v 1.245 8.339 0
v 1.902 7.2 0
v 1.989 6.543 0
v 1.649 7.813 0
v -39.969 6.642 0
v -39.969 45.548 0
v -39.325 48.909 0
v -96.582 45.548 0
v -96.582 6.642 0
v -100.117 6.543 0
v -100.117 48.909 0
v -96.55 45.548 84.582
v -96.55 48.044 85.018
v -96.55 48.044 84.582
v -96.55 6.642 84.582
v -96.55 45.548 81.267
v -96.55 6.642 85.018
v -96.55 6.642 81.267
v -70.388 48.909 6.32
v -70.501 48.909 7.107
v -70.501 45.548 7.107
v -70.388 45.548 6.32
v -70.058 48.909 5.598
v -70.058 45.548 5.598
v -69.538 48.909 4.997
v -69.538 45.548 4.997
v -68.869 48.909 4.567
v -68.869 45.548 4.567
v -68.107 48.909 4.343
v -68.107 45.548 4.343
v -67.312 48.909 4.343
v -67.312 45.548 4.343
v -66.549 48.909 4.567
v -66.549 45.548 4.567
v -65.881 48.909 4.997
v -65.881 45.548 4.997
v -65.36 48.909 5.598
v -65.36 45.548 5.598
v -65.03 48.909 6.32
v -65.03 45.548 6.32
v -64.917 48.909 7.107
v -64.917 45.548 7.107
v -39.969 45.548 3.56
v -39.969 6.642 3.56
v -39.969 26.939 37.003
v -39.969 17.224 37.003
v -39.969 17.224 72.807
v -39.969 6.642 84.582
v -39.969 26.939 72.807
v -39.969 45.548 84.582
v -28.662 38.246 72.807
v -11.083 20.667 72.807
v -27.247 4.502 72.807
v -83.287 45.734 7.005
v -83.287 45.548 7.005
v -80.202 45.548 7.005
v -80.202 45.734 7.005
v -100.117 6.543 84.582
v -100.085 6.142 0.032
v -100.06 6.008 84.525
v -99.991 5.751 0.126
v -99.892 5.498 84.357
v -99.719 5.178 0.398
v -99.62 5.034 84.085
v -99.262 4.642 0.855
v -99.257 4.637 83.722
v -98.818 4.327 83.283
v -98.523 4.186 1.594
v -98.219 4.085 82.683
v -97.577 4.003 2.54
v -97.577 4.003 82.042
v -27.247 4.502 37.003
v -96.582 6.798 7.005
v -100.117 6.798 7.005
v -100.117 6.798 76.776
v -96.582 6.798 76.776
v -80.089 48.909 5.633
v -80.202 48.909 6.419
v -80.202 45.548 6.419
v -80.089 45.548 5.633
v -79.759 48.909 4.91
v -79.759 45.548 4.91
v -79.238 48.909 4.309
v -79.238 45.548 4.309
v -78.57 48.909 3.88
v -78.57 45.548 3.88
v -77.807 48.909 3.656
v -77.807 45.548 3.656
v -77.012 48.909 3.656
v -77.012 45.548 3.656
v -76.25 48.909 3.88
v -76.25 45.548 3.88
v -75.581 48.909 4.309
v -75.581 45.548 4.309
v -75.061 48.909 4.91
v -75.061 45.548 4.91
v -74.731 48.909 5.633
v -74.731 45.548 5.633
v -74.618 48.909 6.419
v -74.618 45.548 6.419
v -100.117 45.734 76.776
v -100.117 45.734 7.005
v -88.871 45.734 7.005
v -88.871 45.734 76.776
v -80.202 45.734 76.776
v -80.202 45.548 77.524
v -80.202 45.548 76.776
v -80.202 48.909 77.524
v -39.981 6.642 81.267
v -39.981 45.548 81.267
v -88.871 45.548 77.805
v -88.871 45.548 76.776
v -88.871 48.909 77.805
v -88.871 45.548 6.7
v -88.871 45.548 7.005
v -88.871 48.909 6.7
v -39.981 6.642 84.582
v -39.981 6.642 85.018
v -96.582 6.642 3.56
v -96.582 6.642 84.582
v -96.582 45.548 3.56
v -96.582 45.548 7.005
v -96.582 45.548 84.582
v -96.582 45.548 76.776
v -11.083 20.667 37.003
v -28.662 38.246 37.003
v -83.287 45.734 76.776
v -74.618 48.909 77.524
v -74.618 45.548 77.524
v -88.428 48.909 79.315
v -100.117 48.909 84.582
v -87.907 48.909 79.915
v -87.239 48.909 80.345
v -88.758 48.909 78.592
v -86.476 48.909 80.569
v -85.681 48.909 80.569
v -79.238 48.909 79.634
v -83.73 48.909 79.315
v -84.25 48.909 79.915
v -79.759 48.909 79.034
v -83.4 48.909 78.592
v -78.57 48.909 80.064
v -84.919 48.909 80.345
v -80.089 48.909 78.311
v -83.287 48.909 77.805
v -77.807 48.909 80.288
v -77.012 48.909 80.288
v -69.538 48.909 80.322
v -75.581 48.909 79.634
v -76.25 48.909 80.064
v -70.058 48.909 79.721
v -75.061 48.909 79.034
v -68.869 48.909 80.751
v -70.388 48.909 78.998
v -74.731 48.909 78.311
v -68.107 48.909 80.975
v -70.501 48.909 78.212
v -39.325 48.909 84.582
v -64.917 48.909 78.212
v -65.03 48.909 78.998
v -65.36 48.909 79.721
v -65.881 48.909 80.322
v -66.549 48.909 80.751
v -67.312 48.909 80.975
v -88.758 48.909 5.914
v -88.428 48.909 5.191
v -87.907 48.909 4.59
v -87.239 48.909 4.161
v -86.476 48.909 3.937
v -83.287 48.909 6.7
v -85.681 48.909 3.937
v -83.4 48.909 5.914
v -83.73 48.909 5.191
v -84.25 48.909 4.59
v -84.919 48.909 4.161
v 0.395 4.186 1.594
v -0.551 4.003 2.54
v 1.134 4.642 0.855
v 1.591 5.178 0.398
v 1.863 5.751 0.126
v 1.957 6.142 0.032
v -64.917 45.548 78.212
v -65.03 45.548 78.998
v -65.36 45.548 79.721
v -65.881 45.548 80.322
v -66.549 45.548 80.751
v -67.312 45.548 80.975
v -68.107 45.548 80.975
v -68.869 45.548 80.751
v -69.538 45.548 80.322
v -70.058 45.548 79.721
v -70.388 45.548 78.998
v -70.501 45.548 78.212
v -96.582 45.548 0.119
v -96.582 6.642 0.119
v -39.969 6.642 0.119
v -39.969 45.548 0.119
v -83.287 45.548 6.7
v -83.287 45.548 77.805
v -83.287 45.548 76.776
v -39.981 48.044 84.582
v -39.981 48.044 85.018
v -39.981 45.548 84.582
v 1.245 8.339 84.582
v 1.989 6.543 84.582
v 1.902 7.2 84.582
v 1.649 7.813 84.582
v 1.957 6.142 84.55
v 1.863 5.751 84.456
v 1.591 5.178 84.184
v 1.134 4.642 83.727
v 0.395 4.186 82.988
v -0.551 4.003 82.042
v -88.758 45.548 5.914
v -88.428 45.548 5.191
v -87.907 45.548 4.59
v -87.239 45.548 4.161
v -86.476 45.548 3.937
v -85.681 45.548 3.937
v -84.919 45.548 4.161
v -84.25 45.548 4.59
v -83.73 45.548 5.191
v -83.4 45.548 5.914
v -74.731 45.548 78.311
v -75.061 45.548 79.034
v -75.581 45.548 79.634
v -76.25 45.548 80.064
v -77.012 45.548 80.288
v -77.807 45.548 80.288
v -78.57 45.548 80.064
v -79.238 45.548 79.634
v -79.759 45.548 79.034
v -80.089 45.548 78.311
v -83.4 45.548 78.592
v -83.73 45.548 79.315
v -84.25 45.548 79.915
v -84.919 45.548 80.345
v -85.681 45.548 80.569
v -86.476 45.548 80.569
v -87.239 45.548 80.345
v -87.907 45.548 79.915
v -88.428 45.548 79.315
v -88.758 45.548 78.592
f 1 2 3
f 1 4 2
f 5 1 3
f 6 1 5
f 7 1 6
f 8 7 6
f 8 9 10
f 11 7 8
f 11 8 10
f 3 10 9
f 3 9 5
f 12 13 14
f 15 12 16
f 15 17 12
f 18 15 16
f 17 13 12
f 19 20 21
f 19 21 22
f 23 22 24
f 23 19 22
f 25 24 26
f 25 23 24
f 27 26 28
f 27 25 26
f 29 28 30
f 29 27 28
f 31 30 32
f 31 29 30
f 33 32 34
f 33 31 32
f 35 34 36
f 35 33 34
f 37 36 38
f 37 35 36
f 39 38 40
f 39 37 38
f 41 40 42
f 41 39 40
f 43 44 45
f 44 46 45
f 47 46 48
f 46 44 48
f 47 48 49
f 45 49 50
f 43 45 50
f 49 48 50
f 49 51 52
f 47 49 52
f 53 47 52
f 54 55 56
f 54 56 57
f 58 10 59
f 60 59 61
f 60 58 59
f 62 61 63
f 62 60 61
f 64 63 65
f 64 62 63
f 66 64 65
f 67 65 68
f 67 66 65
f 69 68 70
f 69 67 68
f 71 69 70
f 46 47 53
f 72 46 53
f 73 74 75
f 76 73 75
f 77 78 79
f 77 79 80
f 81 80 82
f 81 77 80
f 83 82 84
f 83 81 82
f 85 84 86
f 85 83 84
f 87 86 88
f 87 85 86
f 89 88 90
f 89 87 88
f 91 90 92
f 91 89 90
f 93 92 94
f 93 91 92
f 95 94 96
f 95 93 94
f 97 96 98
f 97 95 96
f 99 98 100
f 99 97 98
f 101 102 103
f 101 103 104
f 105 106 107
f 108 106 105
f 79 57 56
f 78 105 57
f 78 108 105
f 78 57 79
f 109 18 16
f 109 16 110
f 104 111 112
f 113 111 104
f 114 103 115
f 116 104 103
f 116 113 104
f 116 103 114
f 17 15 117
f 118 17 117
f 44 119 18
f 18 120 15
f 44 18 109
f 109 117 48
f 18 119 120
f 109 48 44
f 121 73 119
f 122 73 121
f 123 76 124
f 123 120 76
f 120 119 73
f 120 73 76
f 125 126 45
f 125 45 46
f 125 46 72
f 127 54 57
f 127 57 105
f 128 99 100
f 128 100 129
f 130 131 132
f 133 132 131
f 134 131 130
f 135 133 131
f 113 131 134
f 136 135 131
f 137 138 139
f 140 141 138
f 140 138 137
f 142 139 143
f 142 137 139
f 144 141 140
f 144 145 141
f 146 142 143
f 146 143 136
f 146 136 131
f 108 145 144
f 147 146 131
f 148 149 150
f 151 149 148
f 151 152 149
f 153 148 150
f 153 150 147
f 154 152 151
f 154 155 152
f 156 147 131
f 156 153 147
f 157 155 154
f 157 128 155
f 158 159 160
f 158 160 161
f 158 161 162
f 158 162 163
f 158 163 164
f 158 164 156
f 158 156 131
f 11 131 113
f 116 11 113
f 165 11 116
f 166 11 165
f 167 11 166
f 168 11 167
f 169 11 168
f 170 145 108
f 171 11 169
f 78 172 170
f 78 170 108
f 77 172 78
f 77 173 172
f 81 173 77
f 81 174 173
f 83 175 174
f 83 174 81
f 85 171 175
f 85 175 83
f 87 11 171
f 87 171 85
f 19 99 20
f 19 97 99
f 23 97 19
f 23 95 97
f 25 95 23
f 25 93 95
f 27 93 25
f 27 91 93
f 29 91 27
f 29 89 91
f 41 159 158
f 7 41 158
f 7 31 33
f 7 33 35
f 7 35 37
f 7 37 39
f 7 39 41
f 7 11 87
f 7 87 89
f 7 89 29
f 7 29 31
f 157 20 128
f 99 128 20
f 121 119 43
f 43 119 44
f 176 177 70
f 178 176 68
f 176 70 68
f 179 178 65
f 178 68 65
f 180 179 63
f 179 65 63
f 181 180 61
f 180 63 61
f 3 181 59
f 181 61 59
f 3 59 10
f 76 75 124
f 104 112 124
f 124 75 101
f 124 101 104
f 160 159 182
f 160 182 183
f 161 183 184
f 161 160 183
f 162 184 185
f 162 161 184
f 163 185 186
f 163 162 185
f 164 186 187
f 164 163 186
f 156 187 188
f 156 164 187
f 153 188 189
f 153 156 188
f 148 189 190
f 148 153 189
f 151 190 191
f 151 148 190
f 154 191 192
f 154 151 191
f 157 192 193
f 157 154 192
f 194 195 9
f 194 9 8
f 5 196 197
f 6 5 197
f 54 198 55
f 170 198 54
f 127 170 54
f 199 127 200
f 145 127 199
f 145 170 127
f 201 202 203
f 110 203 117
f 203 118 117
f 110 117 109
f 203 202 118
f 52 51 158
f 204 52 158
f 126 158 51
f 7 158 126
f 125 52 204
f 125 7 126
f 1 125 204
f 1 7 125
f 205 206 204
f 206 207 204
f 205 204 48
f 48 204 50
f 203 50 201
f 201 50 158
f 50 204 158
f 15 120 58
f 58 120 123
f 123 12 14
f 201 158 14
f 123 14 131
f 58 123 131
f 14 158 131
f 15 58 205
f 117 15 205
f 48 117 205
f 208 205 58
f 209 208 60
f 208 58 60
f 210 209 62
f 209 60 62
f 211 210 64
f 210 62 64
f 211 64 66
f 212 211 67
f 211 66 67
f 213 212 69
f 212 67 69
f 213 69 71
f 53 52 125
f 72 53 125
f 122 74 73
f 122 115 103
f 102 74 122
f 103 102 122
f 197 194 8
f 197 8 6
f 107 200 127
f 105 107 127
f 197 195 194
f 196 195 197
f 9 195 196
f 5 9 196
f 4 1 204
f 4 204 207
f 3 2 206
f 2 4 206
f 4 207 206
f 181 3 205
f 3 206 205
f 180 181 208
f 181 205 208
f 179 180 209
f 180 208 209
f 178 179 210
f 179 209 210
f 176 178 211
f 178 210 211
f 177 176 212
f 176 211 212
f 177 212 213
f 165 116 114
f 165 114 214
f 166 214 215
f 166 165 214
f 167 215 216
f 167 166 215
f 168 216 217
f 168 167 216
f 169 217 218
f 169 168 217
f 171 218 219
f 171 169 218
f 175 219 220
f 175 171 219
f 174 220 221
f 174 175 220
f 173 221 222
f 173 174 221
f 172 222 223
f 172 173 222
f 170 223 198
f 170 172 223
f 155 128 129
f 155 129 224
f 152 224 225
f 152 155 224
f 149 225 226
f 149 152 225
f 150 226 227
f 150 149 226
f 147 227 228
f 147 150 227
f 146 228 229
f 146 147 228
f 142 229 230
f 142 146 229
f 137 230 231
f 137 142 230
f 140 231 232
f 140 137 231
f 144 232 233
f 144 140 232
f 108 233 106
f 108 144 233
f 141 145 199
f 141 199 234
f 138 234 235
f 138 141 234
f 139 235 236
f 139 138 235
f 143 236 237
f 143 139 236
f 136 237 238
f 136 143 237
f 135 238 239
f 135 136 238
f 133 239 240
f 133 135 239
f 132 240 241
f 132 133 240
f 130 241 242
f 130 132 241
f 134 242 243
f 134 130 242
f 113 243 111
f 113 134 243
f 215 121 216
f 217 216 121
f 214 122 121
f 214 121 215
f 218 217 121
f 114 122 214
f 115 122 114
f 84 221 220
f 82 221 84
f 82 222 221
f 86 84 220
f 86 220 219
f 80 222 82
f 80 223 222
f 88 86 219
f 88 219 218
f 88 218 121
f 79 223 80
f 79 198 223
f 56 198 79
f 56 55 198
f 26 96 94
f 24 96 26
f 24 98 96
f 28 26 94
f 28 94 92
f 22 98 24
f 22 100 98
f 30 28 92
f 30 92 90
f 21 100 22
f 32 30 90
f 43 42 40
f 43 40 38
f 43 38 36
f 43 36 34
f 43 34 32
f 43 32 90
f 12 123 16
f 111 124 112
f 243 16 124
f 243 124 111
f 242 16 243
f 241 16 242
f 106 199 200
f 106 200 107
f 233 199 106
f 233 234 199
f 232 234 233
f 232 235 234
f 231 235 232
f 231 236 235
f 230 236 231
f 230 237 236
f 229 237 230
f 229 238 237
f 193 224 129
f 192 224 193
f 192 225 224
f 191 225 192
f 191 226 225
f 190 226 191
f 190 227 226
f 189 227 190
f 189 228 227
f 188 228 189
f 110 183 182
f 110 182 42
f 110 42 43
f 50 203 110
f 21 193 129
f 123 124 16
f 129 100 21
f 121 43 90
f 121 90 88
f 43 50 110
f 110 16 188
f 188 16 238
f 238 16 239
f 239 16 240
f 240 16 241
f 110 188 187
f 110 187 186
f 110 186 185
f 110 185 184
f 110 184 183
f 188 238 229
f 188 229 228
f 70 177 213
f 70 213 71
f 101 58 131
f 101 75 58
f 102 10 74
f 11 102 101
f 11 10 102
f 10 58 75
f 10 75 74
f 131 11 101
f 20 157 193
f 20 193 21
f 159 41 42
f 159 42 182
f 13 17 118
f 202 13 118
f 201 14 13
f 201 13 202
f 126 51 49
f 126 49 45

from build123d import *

# Parameters (mm, degrees)
Y_KSEKLIK_EKSTR_ZYON1_DEPTH = 84.582
IZIM2_W                     = 56.613252044
IZIM2_H                     = 38.905458561
KES_EKSTR_ZYON1_DEPTH       = 84.582
IZIM3_W                     = 24.859999106
IZIM3_H                     = 35.80382045
KES_EKSTR_ZYON2_DEPTH       = 22.86
IZIM4_W                     = 56.56840029
IZIM4_H                     = 3.7507773
Y_KSEKLIK_EKSTR_ZYON3_DEPTH = 41.402
IZIM5_W                     = 56.873307594
IZIM5_H                     = 3.441337166
Y_KSEKLIK_EKSTR_ZYON4_DEPTH = 41.402
KES_EKSTR_ZYON3_DEPTH       = 20.828
IZIM7_W                     = 69.770370065
IZIM7_H                     = 38.93587287
KES_EKSTR_ZYON4_DEPTH       = 20.828
RADYUS1_R                   = 2.54


with BuildPart() as part:
    # Çizim1 → Yükseklik-Ekstrüzyon1 (new body)
    with BuildSketch(Plane.XY):
        Polygon((-100.117298217, 48.908980301), (-39.325061833, 48.908980301), (5.581137472, 4.002780997), (-100.117298217, 4.002780997), align=None)
    extrude(amount=Y_KSEKLIK_EKSTR_ZYON1_DEPTH)

    # Çizim2 → Kes-Ekstrüzyon1 (cut)
    with BuildSketch(Plane.XY.offset(84.582)):
        with Locations((-68.275200444, 26.094986488)):
            Rectangle(IZIM2_W, IZIM2_H)
    extrude(amount=-KES_EKSTR_ZYON1_DEPTH, mode=Mode.SUBTRACT)

    # Çizim3 → Kes-Ekstrüzyon2 (cut)
    with BuildSketch(Plane(origin=(4.791959234, 4.791959234, 0), x_dir=(0.7071067811865521, -0.7071067811865429, 0), z_dir=(0.7071067811865429, 0.7071067811865521, 0))):
        with Locations((-34.88056776, -54.904893427)):
            Rectangle(IZIM3_W, IZIM3_H)
    extrude(amount=-KES_EKSTR_ZYON2_DEPTH, mode=Mode.SUBTRACT)

    # Çizim4 → Yükseklik-Ekstrüzyon3 (add)
    with BuildSketch(Plane(origin=(0, 6.642257207, 0.5213718), x_dir=(1, 0, 0), z_dir=(0, 1, 0))):
        with Locations((-68.26547223, -82.621441536)):
            Rectangle(IZIM4_W, IZIM4_H)
    extrude(amount=Y_KSEKLIK_EKSTR_ZYON3_DEPTH)

    # Çizim5 → Yükseklik-Ekstrüzyon4 (add)
    with BuildSketch(Plane(origin=(0, 6.642257207, 0), x_dir=(1, 0, 0), z_dir=(0, 1, 0))):
        with Locations((-68.314463999, -1.839596634)):
            Rectangle(IZIM5_W, IZIM5_H)
    extrude(amount=Y_KSEKLIK_EKSTR_ZYON4_DEPTH)

    # Çizim6 → Kes-Ekstrüzyon3 (cut)
    with BuildSketch(Plane(origin=(0, 48.908980301, 0), x_dir=(1, 0, 0), z_dir=(0, 1, 0))):
        with BuildLine():
            Line((-88.870816985, -77.80498522), (-88.870816985, -6.700388759))
            ThreePointArc((-88.870816985, -6.700388759), (-86.078686723, -3.908258497), (-83.286556461, -6.700388759))
            Line((-83.286556461, -6.700388759), (-83.286556461, -77.80498522))
            ThreePointArc((-83.286556461, -77.80498522), (-86.078686723, -80.597115482), (-88.870816985, -77.80498522))
        make_face()
        with BuildLine():
            Line((-80.201988502, -77.524018239), (-80.201988502, -6.419421778))
            ThreePointArc((-80.201988502, -6.419421778), (-77.40985824, -3.627291516), (-74.617727978, -6.419421778))
            Line((-74.617727978, -6.419421778), (-74.617727978, -77.524018239))
            ThreePointArc((-74.617727978, -77.524018239), (-77.40985824, -80.316148501), (-80.201988502, -77.524018239))
        make_face()
        with BuildLine():
            Line((-70.501383696, -78.211655362), (-70.501383696, -7.107058901))
            ThreePointArc((-70.501383696, -7.107058901), (-67.709253434, -4.314928639), (-64.917123172, -7.107058901))
            Line((-64.917123172, -7.107058901), (-64.917123172, -78.211655362))
            ThreePointArc((-64.917123172, -78.211655362), (-67.709253434, -81.003785624), (-70.501383696, -78.211655362))
        make_face()
    extrude(amount=-KES_EKSTR_ZYON3_DEPTH, mode=Mode.SUBTRACT)

    # Çizim7 → Kes-Ekstrüzyon4 (cut)
    with BuildSketch(Plane.ZY.offset(100.117298217)):
        with Locations((41.890344752, 26.266043038)):
            Rectangle(IZIM7_W, IZIM7_H)
    extrude(amount=-KES_EKSTR_ZYON4_DEPTH, mode=Mode.SUBTRACT)

    # Radyus1
    radyus1_edges = [part.edges().sort_by_distance(p)[0] for p in [
        (-47.268080373, 4.002780997, 0),
        (-47.268080373, 4.002780997, 84.582),
        (5.581137472, 4.002780997, 42.291),
        (-100.117298217, 4.002780997, 42.291),
    ]]
    fillet(radyus1_edges, radius=RADYUS1_R)


solid = part.part
